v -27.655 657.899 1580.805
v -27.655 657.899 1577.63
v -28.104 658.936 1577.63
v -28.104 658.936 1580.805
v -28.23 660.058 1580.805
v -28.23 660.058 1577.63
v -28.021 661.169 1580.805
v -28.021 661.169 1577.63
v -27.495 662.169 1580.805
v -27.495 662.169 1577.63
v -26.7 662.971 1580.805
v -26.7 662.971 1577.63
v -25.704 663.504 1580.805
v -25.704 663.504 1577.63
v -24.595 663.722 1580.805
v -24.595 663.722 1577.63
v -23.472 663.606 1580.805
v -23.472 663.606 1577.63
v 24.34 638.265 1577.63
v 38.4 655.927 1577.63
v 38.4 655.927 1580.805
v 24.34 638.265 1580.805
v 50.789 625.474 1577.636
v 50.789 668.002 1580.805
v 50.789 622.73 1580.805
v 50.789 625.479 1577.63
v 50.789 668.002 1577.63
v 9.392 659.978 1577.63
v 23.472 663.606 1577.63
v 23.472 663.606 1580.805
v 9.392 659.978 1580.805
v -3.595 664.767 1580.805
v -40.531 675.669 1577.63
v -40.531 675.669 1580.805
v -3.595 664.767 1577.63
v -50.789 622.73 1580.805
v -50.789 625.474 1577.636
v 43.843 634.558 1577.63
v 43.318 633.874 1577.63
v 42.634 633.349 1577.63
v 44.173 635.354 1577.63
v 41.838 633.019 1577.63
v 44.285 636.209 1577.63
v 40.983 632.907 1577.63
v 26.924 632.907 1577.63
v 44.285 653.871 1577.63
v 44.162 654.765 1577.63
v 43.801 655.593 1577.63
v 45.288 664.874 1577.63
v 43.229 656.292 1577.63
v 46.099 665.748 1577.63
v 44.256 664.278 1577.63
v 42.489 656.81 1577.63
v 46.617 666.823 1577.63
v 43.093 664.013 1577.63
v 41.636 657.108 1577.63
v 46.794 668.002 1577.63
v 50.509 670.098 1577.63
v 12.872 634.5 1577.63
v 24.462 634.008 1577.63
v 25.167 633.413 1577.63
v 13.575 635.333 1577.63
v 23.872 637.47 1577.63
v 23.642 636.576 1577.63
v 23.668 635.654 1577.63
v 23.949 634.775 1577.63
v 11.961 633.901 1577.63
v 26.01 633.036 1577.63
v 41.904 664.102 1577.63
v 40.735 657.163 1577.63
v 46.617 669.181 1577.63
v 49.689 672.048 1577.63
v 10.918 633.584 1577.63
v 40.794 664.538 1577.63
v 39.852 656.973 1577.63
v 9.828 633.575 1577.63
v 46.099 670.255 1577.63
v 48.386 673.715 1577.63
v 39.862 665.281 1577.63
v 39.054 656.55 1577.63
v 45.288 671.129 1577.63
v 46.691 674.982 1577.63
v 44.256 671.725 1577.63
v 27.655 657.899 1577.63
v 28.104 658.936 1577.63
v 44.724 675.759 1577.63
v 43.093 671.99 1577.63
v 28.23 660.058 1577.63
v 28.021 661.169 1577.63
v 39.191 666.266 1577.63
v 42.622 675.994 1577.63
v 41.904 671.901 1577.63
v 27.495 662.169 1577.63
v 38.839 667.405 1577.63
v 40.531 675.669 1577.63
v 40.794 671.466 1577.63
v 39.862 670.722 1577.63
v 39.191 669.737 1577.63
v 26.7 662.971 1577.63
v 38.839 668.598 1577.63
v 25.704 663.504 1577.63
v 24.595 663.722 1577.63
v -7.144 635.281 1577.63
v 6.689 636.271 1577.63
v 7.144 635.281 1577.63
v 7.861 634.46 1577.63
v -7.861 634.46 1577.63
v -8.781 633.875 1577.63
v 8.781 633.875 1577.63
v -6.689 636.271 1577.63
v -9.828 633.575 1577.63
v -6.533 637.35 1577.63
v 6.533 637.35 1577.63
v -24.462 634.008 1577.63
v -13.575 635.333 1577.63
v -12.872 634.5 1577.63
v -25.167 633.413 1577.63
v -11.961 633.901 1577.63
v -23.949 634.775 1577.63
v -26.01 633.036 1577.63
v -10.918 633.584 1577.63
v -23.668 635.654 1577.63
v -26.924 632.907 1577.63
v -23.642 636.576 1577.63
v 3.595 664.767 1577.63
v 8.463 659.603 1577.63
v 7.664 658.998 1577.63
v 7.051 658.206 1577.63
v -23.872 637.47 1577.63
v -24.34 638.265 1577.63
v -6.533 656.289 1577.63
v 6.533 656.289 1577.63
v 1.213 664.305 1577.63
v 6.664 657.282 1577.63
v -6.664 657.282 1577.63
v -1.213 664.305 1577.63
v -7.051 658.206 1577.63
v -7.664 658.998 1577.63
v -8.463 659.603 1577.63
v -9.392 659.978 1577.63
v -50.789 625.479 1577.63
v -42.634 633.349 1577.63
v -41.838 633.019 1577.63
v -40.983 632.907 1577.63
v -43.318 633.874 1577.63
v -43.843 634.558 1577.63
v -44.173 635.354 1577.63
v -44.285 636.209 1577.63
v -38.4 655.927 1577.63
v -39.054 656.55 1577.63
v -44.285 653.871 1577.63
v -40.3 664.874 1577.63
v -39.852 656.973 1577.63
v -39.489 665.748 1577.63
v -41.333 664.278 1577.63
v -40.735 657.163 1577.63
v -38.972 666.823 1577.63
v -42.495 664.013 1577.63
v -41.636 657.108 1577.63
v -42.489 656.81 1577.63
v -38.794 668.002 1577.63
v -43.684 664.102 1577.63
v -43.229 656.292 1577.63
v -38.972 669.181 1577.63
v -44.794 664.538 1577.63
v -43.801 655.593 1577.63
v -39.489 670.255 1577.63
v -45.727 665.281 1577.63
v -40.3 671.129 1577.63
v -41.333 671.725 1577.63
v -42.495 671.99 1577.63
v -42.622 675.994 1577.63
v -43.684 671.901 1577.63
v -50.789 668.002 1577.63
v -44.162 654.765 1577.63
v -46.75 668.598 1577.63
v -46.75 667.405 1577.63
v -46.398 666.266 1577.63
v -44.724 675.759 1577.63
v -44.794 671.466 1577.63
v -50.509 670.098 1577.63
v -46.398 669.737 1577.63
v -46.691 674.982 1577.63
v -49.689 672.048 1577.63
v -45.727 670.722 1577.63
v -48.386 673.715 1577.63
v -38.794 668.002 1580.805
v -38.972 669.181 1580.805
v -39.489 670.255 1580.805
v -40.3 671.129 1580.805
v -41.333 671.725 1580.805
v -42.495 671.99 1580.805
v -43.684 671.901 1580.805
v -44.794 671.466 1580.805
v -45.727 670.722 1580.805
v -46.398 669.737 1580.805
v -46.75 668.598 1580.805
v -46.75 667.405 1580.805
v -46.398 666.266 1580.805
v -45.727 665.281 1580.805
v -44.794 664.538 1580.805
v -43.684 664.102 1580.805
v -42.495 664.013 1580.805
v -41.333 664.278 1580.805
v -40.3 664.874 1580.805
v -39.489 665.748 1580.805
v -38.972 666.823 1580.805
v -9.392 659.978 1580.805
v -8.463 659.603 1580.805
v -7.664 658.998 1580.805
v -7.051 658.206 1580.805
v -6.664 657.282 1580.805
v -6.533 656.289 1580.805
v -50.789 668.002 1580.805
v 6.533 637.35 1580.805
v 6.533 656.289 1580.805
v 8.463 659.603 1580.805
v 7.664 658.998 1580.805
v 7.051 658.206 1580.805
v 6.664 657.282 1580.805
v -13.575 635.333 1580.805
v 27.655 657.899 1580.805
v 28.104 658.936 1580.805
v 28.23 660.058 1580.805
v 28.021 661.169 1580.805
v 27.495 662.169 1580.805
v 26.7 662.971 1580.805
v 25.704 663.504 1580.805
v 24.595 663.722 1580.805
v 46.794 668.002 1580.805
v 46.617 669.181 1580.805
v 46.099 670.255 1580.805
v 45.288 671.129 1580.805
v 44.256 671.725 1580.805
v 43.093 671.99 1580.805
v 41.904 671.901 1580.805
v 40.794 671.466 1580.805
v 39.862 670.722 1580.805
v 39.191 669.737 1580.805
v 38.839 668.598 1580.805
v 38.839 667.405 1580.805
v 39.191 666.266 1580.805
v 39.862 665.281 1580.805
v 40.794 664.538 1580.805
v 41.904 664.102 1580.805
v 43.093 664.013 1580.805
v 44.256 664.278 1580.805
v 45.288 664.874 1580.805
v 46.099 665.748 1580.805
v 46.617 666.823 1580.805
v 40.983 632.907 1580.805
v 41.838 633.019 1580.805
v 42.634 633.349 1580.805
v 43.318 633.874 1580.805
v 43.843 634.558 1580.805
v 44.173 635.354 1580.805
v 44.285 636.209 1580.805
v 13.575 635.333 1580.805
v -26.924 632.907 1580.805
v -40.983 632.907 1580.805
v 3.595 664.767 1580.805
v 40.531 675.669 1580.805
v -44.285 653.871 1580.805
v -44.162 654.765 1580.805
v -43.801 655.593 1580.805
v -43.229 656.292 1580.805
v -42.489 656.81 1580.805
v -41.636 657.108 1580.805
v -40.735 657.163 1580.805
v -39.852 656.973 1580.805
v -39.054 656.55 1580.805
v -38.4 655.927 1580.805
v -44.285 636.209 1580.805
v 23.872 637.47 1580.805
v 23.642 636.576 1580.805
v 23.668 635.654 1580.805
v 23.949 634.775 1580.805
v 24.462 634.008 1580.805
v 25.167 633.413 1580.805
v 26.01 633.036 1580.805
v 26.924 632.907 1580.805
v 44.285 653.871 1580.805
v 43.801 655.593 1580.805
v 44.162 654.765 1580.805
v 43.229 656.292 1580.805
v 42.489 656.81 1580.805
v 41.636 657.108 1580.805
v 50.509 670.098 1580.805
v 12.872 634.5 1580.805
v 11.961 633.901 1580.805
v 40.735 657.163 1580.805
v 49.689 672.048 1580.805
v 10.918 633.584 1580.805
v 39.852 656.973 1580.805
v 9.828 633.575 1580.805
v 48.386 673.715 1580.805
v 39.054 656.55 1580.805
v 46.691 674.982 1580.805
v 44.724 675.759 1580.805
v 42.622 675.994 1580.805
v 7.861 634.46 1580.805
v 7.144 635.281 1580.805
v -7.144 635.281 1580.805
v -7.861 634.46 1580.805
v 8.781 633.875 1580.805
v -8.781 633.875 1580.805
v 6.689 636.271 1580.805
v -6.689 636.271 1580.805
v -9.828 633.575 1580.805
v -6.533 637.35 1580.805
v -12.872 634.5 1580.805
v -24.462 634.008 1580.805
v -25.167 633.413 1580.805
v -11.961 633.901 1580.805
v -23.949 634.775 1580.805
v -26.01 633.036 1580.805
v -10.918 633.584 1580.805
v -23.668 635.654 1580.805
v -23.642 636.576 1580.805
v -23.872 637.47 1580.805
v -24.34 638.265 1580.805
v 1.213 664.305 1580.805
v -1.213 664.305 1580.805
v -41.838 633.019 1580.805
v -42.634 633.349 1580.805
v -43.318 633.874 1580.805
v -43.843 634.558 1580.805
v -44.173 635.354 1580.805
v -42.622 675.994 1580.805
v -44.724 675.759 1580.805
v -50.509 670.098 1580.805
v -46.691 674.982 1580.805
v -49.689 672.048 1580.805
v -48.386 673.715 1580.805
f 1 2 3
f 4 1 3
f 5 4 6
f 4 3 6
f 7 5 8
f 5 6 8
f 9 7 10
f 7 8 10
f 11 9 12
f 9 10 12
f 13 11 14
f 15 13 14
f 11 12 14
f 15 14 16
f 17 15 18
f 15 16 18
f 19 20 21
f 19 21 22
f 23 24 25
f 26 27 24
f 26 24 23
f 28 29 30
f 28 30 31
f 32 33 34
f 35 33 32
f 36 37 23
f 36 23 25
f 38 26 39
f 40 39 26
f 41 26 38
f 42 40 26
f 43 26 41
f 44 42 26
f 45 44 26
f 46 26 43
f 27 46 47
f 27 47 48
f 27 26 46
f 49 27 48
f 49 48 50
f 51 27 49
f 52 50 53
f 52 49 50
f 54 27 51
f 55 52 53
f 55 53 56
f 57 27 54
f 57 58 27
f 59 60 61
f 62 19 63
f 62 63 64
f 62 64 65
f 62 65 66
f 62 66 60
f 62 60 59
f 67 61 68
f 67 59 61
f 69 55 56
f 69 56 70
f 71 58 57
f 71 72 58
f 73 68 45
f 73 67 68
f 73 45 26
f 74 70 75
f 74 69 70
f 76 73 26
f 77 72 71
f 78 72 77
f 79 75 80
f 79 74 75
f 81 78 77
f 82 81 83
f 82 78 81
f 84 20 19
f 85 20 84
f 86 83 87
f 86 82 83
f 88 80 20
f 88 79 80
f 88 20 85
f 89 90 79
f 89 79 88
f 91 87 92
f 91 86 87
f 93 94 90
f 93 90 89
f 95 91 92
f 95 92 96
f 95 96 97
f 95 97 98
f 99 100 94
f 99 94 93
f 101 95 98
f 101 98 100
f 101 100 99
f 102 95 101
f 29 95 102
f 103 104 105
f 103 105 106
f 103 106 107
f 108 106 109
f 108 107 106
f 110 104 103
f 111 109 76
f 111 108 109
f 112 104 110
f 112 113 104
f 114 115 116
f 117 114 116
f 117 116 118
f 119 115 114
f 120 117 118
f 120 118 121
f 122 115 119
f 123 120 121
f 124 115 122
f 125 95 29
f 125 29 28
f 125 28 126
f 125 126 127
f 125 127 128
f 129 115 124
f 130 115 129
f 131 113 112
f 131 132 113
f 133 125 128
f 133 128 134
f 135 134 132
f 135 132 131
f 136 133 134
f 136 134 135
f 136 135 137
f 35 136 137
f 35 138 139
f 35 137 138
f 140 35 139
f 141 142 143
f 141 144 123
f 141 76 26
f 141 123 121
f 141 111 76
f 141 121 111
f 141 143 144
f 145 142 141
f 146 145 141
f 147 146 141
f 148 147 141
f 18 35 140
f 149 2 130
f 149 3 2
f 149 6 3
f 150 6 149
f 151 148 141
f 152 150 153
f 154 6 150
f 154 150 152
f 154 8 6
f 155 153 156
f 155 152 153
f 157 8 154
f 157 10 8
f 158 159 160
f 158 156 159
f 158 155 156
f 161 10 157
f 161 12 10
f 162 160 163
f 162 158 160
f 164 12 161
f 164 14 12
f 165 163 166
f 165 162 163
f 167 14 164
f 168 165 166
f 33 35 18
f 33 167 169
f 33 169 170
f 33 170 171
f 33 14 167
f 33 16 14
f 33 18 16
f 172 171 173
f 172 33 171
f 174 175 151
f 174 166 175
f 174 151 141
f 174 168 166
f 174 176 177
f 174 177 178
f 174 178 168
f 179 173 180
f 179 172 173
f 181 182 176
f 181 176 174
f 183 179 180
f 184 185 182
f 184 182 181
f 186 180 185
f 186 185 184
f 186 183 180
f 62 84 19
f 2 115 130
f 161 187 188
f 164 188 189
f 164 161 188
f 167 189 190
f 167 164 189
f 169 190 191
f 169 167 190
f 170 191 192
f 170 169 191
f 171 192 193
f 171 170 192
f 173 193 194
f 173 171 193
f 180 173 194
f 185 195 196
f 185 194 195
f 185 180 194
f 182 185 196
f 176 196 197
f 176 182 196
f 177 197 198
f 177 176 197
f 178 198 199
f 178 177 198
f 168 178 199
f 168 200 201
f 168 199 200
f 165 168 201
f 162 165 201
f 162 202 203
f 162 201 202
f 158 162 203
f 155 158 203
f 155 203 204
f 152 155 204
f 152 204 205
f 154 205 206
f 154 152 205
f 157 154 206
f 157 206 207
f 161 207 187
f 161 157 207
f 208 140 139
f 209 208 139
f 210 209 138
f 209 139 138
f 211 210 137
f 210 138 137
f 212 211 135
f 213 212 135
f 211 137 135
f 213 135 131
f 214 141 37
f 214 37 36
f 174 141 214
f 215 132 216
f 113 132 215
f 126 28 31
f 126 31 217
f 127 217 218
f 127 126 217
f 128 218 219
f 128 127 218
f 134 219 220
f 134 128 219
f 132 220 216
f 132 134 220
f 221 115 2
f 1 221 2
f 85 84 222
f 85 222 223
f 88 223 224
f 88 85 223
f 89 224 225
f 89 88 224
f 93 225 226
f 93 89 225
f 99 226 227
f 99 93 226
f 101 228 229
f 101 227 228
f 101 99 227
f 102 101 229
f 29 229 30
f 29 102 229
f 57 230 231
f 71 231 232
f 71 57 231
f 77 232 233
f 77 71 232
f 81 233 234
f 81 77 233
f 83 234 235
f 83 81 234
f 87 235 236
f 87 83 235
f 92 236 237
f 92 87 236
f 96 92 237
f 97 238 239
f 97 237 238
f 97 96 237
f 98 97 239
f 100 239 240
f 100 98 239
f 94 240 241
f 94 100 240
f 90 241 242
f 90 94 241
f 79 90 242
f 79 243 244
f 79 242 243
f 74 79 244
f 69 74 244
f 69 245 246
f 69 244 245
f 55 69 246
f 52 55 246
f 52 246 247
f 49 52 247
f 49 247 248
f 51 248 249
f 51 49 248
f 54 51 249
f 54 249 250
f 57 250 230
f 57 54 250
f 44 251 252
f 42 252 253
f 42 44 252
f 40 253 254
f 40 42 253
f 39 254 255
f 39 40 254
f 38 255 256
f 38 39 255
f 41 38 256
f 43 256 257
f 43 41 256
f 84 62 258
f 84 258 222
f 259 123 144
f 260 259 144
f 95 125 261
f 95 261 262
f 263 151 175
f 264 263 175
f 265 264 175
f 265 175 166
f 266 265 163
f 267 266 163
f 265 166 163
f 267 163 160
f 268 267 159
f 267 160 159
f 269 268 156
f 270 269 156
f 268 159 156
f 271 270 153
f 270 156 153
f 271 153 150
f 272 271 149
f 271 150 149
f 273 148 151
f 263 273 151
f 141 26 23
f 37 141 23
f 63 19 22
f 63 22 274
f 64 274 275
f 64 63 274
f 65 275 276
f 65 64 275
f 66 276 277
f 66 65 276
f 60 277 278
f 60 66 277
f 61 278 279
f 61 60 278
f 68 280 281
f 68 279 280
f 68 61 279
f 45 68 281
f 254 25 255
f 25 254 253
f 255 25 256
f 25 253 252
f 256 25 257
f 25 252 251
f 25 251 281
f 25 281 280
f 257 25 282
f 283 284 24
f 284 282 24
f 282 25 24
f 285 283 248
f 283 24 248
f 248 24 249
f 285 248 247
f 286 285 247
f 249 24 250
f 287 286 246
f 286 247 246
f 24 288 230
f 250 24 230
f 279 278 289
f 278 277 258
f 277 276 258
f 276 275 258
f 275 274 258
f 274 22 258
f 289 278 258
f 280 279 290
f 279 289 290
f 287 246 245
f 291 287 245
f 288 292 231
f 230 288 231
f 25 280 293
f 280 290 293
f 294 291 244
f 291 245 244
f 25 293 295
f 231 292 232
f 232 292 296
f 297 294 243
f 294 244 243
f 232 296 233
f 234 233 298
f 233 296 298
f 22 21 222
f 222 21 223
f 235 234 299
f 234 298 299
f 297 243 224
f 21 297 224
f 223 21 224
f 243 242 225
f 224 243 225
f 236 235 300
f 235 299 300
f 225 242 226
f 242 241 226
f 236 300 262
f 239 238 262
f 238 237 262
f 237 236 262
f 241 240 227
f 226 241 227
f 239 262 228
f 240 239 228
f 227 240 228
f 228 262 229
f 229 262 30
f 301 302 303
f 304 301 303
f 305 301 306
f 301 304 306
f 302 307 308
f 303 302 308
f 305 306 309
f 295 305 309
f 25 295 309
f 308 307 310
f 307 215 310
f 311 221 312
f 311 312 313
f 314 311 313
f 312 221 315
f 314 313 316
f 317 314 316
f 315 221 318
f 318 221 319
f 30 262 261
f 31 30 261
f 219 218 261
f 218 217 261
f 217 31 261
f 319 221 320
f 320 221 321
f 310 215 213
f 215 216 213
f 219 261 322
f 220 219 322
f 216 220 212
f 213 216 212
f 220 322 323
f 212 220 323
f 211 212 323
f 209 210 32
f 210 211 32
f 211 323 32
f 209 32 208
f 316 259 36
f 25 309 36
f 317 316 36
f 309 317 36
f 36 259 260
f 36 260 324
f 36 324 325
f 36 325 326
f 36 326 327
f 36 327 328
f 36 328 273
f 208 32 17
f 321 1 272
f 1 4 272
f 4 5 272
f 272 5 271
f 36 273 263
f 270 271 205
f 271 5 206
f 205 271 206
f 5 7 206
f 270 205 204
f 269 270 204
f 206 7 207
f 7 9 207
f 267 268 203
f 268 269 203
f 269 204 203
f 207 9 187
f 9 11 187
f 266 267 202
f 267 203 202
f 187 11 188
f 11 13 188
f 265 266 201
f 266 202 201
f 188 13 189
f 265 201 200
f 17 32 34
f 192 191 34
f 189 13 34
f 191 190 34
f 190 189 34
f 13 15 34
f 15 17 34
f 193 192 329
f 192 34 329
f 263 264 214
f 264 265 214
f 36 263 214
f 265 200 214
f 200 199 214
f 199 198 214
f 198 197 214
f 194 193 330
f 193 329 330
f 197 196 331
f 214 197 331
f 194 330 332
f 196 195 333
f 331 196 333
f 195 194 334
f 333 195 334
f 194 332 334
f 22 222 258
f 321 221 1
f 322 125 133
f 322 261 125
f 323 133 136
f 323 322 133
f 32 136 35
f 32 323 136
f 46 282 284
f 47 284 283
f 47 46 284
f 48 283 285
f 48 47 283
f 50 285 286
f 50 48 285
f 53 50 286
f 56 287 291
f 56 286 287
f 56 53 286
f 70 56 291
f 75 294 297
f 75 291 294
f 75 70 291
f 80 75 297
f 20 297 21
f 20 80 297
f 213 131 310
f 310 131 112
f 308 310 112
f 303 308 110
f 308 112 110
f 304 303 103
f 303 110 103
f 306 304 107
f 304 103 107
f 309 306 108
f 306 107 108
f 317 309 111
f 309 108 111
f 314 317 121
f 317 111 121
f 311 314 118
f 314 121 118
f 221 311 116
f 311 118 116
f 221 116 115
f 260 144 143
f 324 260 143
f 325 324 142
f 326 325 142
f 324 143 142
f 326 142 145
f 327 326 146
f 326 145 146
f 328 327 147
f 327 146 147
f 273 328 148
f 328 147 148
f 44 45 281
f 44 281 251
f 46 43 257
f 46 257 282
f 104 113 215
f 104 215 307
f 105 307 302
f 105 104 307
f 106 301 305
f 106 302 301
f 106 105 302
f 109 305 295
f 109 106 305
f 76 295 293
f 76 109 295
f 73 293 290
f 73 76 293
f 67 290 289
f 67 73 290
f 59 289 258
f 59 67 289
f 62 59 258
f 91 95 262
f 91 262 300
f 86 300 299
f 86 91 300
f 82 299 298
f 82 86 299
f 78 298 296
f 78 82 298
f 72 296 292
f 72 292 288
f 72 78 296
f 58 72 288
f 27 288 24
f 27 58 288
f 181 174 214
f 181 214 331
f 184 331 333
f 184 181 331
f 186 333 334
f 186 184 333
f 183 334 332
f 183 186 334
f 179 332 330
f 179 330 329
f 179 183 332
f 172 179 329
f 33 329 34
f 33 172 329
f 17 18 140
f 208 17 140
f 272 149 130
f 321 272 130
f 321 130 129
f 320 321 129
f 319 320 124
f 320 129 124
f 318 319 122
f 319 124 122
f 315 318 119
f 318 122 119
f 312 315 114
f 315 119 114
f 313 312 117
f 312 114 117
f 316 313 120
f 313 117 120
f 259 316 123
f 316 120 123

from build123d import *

# Parameters (mm, degrees)
BOSS_EXTRUDE1_DEPTH = 3.175
SKETCH1_8_R         = 3.999992
CUT_EXTRUDE1_DEPTH  = 20.701
SKETCH1_9_R         = 3.999992
CUT_EXTRUDE2_DEPTH  = 19.431
CUT_EXTRUDE8_DEPTH  = 20.193
FILLET1_R           = 12.7
CUT_EXTRUDE9_DEPTH  = 126.238


with BuildPart() as part:
    # Sketch1 → Boss-Extrude1 (new body)
    with BuildSketch(Plane.XY.offset(1577.629912845)):
        with BuildLine():
            Line((50.788624607, 668.00159627), (50.788624607, 617.20159627))
            Line((50.788624607, 617.20159627), (-50.788624607, 617.20159627))
            Line((-50.788624607, 617.20159627), (-50.788624607, 668.00159627))
            ThreePointArc((-50.788624607, 668.00159627), (-47.580641699, 674.404695353), (-40.531332209, 675.668842459))
            Line((-40.531332209, 675.668842459), (0, 663.705728602))
            Line((0, 663.705728602), (40.531332209, 675.668842459))
            ThreePointArc((40.531332209, 675.668842459), (47.580641699, 674.404695353), (50.788624607, 668.00159627))
        make_face()
    extrude(amount=BOSS_EXTRUDE1_DEPTH)

    # Sketch1<8> → Cut-Extrude1 (cut)
    with BuildSketch(Plane.XY.offset(1577.629912845)):
        with Locations((42.794374999, 668.00159627)):
            Circle(SKETCH1_8_R)
    extrude(amount=CUT_EXTRUDE1_DEPTH, mode=Mode.SUBTRACT)

    # Sketch1<9> → Cut-Extrude2 (cut)
    with BuildSketch(Plane.XY.offset(1577.629912845)):
        with Locations((-42.794374999, 668.00159627)):
            Circle(SKETCH1_9_R)
    extrude(amount=CUT_EXTRUDE2_DEPTH, mode=Mode.SUBTRACT)

    # Sketch1<17> → Cut-Extrude8 (cut)
    with BuildSketch(Plane.XY.offset(1577.629912845)):
        with BuildLine():
            Line((13.57510941, 635.333202119), (27.654813941, 657.899286932))
            ThreePointArc((27.654813941, 657.899286932), (27.495220576, 662.168612345), (23.471836113, 663.605618605))
            Line((23.471836113, 663.605618605), (9.392131582, 659.978176021))
            ThreePointArc((9.392131582, 659.978176021), (7.331231426, 658.6225908), (6.532685397, 656.288657429))
            Line((6.532685397, 656.288657429), (6.532685397, 637.350015199))
            ThreePointArc((6.532685397, 637.350015199), (9.293741997, 633.687254253), (13.57510941, 635.333202119))
        make_face()
        with BuildLine():
            Line((38.399954792, 655.927224031), (24.340132355, 638.265442375))
            ThreePointArc((24.340132355, 638.265442375), (23.94914071, 634.774942338), (26.92351994, 632.906913117))
            Line((26.92351994, 632.906913117), (40.983342377, 632.906913117))
            ThreePointArc((40.983342377, 632.906913117), (43.318208968, 633.874046526), (44.285342377, 636.208913117))
            Line((44.285342377, 636.208913117), (44.285342377, 653.870694774))
            ThreePointArc((44.285342377, 653.870694774), (42.072575638, 656.987868959), (38.399954792, 655.927224031))
        make_face()
        with BuildLine():
            Line((-44.285342377, 636.208913117), (-44.285342377, 653.870694774))
            ThreePointArc((-44.285342377, 653.870694774), (-42.072575638, 656.987868959), (-38.399954792, 655.927224031))
            Line((-38.399954792, 655.927224031), (-24.340132355, 638.265442375))
            ThreePointArc((-24.340132355, 638.265442375), (-23.94914071, 634.774942338), (-26.92351994, 632.906913117))
            Line((-26.92351994, 632.906913117), (-40.983342377, 632.906913117))
            ThreePointArc((-40.983342377, 632.906913117), (-43.318208968, 633.874046526), (-44.285342377, 636.208913117))
        make_face()
        with BuildLine():
            Line((-6.532685397, 656.288657429), (-6.532685397, 637.350015199))
            ThreePointArc((-6.532685397, 637.350015199), (-9.293741997, 633.687254253), (-13.57510941, 635.333202119))
            Line((-13.57510941, 635.333202119), (-27.654813941, 657.899286932))
            ThreePointArc((-27.654813941, 657.899286932), (-27.495220576, 662.168612345), (-23.471836113, 663.605618605))
            Line((-23.471836113, 663.605618605), (-9.392131582, 659.978176021))
            ThreePointArc((-9.392131582, 659.978176021), (-7.331231426, 658.6225908), (-6.532685397, 656.288657429))
        make_face()
    extrude(amount=CUT_EXTRUDE8_DEPTH, mode=Mode.SUBTRACT)

    # Fillet1
    fillet1_edges = [part.edges().sort_by_distance(p)[0] for p in [
        (0, 663.705728602, 1579.217412845),
    ]]
    fillet(fillet1_edges, radius=FILLET1_R)

    # Sketch5 → Cut-Extrude9 (cut)
    with BuildSketch(Plane(origin=(50.788624607, 0, 0), x_dir=(0, 0, -1), z_dir=(1, 0, 0))):
        Polygon((-1577.636028368, 625.473682851), (-1580.804912845, 622.730103166), (-1584.510921517, 619.521488216), (-1584.510921517, 612.304065089), (-1576.030251426, 612.304065089), (-1576.030251426, 626.863944008), align=None)
    extrude(amount=-CUT_EXTRUDE9_DEPTH, mode=Mode.SUBTRACT)


solid = part.part
